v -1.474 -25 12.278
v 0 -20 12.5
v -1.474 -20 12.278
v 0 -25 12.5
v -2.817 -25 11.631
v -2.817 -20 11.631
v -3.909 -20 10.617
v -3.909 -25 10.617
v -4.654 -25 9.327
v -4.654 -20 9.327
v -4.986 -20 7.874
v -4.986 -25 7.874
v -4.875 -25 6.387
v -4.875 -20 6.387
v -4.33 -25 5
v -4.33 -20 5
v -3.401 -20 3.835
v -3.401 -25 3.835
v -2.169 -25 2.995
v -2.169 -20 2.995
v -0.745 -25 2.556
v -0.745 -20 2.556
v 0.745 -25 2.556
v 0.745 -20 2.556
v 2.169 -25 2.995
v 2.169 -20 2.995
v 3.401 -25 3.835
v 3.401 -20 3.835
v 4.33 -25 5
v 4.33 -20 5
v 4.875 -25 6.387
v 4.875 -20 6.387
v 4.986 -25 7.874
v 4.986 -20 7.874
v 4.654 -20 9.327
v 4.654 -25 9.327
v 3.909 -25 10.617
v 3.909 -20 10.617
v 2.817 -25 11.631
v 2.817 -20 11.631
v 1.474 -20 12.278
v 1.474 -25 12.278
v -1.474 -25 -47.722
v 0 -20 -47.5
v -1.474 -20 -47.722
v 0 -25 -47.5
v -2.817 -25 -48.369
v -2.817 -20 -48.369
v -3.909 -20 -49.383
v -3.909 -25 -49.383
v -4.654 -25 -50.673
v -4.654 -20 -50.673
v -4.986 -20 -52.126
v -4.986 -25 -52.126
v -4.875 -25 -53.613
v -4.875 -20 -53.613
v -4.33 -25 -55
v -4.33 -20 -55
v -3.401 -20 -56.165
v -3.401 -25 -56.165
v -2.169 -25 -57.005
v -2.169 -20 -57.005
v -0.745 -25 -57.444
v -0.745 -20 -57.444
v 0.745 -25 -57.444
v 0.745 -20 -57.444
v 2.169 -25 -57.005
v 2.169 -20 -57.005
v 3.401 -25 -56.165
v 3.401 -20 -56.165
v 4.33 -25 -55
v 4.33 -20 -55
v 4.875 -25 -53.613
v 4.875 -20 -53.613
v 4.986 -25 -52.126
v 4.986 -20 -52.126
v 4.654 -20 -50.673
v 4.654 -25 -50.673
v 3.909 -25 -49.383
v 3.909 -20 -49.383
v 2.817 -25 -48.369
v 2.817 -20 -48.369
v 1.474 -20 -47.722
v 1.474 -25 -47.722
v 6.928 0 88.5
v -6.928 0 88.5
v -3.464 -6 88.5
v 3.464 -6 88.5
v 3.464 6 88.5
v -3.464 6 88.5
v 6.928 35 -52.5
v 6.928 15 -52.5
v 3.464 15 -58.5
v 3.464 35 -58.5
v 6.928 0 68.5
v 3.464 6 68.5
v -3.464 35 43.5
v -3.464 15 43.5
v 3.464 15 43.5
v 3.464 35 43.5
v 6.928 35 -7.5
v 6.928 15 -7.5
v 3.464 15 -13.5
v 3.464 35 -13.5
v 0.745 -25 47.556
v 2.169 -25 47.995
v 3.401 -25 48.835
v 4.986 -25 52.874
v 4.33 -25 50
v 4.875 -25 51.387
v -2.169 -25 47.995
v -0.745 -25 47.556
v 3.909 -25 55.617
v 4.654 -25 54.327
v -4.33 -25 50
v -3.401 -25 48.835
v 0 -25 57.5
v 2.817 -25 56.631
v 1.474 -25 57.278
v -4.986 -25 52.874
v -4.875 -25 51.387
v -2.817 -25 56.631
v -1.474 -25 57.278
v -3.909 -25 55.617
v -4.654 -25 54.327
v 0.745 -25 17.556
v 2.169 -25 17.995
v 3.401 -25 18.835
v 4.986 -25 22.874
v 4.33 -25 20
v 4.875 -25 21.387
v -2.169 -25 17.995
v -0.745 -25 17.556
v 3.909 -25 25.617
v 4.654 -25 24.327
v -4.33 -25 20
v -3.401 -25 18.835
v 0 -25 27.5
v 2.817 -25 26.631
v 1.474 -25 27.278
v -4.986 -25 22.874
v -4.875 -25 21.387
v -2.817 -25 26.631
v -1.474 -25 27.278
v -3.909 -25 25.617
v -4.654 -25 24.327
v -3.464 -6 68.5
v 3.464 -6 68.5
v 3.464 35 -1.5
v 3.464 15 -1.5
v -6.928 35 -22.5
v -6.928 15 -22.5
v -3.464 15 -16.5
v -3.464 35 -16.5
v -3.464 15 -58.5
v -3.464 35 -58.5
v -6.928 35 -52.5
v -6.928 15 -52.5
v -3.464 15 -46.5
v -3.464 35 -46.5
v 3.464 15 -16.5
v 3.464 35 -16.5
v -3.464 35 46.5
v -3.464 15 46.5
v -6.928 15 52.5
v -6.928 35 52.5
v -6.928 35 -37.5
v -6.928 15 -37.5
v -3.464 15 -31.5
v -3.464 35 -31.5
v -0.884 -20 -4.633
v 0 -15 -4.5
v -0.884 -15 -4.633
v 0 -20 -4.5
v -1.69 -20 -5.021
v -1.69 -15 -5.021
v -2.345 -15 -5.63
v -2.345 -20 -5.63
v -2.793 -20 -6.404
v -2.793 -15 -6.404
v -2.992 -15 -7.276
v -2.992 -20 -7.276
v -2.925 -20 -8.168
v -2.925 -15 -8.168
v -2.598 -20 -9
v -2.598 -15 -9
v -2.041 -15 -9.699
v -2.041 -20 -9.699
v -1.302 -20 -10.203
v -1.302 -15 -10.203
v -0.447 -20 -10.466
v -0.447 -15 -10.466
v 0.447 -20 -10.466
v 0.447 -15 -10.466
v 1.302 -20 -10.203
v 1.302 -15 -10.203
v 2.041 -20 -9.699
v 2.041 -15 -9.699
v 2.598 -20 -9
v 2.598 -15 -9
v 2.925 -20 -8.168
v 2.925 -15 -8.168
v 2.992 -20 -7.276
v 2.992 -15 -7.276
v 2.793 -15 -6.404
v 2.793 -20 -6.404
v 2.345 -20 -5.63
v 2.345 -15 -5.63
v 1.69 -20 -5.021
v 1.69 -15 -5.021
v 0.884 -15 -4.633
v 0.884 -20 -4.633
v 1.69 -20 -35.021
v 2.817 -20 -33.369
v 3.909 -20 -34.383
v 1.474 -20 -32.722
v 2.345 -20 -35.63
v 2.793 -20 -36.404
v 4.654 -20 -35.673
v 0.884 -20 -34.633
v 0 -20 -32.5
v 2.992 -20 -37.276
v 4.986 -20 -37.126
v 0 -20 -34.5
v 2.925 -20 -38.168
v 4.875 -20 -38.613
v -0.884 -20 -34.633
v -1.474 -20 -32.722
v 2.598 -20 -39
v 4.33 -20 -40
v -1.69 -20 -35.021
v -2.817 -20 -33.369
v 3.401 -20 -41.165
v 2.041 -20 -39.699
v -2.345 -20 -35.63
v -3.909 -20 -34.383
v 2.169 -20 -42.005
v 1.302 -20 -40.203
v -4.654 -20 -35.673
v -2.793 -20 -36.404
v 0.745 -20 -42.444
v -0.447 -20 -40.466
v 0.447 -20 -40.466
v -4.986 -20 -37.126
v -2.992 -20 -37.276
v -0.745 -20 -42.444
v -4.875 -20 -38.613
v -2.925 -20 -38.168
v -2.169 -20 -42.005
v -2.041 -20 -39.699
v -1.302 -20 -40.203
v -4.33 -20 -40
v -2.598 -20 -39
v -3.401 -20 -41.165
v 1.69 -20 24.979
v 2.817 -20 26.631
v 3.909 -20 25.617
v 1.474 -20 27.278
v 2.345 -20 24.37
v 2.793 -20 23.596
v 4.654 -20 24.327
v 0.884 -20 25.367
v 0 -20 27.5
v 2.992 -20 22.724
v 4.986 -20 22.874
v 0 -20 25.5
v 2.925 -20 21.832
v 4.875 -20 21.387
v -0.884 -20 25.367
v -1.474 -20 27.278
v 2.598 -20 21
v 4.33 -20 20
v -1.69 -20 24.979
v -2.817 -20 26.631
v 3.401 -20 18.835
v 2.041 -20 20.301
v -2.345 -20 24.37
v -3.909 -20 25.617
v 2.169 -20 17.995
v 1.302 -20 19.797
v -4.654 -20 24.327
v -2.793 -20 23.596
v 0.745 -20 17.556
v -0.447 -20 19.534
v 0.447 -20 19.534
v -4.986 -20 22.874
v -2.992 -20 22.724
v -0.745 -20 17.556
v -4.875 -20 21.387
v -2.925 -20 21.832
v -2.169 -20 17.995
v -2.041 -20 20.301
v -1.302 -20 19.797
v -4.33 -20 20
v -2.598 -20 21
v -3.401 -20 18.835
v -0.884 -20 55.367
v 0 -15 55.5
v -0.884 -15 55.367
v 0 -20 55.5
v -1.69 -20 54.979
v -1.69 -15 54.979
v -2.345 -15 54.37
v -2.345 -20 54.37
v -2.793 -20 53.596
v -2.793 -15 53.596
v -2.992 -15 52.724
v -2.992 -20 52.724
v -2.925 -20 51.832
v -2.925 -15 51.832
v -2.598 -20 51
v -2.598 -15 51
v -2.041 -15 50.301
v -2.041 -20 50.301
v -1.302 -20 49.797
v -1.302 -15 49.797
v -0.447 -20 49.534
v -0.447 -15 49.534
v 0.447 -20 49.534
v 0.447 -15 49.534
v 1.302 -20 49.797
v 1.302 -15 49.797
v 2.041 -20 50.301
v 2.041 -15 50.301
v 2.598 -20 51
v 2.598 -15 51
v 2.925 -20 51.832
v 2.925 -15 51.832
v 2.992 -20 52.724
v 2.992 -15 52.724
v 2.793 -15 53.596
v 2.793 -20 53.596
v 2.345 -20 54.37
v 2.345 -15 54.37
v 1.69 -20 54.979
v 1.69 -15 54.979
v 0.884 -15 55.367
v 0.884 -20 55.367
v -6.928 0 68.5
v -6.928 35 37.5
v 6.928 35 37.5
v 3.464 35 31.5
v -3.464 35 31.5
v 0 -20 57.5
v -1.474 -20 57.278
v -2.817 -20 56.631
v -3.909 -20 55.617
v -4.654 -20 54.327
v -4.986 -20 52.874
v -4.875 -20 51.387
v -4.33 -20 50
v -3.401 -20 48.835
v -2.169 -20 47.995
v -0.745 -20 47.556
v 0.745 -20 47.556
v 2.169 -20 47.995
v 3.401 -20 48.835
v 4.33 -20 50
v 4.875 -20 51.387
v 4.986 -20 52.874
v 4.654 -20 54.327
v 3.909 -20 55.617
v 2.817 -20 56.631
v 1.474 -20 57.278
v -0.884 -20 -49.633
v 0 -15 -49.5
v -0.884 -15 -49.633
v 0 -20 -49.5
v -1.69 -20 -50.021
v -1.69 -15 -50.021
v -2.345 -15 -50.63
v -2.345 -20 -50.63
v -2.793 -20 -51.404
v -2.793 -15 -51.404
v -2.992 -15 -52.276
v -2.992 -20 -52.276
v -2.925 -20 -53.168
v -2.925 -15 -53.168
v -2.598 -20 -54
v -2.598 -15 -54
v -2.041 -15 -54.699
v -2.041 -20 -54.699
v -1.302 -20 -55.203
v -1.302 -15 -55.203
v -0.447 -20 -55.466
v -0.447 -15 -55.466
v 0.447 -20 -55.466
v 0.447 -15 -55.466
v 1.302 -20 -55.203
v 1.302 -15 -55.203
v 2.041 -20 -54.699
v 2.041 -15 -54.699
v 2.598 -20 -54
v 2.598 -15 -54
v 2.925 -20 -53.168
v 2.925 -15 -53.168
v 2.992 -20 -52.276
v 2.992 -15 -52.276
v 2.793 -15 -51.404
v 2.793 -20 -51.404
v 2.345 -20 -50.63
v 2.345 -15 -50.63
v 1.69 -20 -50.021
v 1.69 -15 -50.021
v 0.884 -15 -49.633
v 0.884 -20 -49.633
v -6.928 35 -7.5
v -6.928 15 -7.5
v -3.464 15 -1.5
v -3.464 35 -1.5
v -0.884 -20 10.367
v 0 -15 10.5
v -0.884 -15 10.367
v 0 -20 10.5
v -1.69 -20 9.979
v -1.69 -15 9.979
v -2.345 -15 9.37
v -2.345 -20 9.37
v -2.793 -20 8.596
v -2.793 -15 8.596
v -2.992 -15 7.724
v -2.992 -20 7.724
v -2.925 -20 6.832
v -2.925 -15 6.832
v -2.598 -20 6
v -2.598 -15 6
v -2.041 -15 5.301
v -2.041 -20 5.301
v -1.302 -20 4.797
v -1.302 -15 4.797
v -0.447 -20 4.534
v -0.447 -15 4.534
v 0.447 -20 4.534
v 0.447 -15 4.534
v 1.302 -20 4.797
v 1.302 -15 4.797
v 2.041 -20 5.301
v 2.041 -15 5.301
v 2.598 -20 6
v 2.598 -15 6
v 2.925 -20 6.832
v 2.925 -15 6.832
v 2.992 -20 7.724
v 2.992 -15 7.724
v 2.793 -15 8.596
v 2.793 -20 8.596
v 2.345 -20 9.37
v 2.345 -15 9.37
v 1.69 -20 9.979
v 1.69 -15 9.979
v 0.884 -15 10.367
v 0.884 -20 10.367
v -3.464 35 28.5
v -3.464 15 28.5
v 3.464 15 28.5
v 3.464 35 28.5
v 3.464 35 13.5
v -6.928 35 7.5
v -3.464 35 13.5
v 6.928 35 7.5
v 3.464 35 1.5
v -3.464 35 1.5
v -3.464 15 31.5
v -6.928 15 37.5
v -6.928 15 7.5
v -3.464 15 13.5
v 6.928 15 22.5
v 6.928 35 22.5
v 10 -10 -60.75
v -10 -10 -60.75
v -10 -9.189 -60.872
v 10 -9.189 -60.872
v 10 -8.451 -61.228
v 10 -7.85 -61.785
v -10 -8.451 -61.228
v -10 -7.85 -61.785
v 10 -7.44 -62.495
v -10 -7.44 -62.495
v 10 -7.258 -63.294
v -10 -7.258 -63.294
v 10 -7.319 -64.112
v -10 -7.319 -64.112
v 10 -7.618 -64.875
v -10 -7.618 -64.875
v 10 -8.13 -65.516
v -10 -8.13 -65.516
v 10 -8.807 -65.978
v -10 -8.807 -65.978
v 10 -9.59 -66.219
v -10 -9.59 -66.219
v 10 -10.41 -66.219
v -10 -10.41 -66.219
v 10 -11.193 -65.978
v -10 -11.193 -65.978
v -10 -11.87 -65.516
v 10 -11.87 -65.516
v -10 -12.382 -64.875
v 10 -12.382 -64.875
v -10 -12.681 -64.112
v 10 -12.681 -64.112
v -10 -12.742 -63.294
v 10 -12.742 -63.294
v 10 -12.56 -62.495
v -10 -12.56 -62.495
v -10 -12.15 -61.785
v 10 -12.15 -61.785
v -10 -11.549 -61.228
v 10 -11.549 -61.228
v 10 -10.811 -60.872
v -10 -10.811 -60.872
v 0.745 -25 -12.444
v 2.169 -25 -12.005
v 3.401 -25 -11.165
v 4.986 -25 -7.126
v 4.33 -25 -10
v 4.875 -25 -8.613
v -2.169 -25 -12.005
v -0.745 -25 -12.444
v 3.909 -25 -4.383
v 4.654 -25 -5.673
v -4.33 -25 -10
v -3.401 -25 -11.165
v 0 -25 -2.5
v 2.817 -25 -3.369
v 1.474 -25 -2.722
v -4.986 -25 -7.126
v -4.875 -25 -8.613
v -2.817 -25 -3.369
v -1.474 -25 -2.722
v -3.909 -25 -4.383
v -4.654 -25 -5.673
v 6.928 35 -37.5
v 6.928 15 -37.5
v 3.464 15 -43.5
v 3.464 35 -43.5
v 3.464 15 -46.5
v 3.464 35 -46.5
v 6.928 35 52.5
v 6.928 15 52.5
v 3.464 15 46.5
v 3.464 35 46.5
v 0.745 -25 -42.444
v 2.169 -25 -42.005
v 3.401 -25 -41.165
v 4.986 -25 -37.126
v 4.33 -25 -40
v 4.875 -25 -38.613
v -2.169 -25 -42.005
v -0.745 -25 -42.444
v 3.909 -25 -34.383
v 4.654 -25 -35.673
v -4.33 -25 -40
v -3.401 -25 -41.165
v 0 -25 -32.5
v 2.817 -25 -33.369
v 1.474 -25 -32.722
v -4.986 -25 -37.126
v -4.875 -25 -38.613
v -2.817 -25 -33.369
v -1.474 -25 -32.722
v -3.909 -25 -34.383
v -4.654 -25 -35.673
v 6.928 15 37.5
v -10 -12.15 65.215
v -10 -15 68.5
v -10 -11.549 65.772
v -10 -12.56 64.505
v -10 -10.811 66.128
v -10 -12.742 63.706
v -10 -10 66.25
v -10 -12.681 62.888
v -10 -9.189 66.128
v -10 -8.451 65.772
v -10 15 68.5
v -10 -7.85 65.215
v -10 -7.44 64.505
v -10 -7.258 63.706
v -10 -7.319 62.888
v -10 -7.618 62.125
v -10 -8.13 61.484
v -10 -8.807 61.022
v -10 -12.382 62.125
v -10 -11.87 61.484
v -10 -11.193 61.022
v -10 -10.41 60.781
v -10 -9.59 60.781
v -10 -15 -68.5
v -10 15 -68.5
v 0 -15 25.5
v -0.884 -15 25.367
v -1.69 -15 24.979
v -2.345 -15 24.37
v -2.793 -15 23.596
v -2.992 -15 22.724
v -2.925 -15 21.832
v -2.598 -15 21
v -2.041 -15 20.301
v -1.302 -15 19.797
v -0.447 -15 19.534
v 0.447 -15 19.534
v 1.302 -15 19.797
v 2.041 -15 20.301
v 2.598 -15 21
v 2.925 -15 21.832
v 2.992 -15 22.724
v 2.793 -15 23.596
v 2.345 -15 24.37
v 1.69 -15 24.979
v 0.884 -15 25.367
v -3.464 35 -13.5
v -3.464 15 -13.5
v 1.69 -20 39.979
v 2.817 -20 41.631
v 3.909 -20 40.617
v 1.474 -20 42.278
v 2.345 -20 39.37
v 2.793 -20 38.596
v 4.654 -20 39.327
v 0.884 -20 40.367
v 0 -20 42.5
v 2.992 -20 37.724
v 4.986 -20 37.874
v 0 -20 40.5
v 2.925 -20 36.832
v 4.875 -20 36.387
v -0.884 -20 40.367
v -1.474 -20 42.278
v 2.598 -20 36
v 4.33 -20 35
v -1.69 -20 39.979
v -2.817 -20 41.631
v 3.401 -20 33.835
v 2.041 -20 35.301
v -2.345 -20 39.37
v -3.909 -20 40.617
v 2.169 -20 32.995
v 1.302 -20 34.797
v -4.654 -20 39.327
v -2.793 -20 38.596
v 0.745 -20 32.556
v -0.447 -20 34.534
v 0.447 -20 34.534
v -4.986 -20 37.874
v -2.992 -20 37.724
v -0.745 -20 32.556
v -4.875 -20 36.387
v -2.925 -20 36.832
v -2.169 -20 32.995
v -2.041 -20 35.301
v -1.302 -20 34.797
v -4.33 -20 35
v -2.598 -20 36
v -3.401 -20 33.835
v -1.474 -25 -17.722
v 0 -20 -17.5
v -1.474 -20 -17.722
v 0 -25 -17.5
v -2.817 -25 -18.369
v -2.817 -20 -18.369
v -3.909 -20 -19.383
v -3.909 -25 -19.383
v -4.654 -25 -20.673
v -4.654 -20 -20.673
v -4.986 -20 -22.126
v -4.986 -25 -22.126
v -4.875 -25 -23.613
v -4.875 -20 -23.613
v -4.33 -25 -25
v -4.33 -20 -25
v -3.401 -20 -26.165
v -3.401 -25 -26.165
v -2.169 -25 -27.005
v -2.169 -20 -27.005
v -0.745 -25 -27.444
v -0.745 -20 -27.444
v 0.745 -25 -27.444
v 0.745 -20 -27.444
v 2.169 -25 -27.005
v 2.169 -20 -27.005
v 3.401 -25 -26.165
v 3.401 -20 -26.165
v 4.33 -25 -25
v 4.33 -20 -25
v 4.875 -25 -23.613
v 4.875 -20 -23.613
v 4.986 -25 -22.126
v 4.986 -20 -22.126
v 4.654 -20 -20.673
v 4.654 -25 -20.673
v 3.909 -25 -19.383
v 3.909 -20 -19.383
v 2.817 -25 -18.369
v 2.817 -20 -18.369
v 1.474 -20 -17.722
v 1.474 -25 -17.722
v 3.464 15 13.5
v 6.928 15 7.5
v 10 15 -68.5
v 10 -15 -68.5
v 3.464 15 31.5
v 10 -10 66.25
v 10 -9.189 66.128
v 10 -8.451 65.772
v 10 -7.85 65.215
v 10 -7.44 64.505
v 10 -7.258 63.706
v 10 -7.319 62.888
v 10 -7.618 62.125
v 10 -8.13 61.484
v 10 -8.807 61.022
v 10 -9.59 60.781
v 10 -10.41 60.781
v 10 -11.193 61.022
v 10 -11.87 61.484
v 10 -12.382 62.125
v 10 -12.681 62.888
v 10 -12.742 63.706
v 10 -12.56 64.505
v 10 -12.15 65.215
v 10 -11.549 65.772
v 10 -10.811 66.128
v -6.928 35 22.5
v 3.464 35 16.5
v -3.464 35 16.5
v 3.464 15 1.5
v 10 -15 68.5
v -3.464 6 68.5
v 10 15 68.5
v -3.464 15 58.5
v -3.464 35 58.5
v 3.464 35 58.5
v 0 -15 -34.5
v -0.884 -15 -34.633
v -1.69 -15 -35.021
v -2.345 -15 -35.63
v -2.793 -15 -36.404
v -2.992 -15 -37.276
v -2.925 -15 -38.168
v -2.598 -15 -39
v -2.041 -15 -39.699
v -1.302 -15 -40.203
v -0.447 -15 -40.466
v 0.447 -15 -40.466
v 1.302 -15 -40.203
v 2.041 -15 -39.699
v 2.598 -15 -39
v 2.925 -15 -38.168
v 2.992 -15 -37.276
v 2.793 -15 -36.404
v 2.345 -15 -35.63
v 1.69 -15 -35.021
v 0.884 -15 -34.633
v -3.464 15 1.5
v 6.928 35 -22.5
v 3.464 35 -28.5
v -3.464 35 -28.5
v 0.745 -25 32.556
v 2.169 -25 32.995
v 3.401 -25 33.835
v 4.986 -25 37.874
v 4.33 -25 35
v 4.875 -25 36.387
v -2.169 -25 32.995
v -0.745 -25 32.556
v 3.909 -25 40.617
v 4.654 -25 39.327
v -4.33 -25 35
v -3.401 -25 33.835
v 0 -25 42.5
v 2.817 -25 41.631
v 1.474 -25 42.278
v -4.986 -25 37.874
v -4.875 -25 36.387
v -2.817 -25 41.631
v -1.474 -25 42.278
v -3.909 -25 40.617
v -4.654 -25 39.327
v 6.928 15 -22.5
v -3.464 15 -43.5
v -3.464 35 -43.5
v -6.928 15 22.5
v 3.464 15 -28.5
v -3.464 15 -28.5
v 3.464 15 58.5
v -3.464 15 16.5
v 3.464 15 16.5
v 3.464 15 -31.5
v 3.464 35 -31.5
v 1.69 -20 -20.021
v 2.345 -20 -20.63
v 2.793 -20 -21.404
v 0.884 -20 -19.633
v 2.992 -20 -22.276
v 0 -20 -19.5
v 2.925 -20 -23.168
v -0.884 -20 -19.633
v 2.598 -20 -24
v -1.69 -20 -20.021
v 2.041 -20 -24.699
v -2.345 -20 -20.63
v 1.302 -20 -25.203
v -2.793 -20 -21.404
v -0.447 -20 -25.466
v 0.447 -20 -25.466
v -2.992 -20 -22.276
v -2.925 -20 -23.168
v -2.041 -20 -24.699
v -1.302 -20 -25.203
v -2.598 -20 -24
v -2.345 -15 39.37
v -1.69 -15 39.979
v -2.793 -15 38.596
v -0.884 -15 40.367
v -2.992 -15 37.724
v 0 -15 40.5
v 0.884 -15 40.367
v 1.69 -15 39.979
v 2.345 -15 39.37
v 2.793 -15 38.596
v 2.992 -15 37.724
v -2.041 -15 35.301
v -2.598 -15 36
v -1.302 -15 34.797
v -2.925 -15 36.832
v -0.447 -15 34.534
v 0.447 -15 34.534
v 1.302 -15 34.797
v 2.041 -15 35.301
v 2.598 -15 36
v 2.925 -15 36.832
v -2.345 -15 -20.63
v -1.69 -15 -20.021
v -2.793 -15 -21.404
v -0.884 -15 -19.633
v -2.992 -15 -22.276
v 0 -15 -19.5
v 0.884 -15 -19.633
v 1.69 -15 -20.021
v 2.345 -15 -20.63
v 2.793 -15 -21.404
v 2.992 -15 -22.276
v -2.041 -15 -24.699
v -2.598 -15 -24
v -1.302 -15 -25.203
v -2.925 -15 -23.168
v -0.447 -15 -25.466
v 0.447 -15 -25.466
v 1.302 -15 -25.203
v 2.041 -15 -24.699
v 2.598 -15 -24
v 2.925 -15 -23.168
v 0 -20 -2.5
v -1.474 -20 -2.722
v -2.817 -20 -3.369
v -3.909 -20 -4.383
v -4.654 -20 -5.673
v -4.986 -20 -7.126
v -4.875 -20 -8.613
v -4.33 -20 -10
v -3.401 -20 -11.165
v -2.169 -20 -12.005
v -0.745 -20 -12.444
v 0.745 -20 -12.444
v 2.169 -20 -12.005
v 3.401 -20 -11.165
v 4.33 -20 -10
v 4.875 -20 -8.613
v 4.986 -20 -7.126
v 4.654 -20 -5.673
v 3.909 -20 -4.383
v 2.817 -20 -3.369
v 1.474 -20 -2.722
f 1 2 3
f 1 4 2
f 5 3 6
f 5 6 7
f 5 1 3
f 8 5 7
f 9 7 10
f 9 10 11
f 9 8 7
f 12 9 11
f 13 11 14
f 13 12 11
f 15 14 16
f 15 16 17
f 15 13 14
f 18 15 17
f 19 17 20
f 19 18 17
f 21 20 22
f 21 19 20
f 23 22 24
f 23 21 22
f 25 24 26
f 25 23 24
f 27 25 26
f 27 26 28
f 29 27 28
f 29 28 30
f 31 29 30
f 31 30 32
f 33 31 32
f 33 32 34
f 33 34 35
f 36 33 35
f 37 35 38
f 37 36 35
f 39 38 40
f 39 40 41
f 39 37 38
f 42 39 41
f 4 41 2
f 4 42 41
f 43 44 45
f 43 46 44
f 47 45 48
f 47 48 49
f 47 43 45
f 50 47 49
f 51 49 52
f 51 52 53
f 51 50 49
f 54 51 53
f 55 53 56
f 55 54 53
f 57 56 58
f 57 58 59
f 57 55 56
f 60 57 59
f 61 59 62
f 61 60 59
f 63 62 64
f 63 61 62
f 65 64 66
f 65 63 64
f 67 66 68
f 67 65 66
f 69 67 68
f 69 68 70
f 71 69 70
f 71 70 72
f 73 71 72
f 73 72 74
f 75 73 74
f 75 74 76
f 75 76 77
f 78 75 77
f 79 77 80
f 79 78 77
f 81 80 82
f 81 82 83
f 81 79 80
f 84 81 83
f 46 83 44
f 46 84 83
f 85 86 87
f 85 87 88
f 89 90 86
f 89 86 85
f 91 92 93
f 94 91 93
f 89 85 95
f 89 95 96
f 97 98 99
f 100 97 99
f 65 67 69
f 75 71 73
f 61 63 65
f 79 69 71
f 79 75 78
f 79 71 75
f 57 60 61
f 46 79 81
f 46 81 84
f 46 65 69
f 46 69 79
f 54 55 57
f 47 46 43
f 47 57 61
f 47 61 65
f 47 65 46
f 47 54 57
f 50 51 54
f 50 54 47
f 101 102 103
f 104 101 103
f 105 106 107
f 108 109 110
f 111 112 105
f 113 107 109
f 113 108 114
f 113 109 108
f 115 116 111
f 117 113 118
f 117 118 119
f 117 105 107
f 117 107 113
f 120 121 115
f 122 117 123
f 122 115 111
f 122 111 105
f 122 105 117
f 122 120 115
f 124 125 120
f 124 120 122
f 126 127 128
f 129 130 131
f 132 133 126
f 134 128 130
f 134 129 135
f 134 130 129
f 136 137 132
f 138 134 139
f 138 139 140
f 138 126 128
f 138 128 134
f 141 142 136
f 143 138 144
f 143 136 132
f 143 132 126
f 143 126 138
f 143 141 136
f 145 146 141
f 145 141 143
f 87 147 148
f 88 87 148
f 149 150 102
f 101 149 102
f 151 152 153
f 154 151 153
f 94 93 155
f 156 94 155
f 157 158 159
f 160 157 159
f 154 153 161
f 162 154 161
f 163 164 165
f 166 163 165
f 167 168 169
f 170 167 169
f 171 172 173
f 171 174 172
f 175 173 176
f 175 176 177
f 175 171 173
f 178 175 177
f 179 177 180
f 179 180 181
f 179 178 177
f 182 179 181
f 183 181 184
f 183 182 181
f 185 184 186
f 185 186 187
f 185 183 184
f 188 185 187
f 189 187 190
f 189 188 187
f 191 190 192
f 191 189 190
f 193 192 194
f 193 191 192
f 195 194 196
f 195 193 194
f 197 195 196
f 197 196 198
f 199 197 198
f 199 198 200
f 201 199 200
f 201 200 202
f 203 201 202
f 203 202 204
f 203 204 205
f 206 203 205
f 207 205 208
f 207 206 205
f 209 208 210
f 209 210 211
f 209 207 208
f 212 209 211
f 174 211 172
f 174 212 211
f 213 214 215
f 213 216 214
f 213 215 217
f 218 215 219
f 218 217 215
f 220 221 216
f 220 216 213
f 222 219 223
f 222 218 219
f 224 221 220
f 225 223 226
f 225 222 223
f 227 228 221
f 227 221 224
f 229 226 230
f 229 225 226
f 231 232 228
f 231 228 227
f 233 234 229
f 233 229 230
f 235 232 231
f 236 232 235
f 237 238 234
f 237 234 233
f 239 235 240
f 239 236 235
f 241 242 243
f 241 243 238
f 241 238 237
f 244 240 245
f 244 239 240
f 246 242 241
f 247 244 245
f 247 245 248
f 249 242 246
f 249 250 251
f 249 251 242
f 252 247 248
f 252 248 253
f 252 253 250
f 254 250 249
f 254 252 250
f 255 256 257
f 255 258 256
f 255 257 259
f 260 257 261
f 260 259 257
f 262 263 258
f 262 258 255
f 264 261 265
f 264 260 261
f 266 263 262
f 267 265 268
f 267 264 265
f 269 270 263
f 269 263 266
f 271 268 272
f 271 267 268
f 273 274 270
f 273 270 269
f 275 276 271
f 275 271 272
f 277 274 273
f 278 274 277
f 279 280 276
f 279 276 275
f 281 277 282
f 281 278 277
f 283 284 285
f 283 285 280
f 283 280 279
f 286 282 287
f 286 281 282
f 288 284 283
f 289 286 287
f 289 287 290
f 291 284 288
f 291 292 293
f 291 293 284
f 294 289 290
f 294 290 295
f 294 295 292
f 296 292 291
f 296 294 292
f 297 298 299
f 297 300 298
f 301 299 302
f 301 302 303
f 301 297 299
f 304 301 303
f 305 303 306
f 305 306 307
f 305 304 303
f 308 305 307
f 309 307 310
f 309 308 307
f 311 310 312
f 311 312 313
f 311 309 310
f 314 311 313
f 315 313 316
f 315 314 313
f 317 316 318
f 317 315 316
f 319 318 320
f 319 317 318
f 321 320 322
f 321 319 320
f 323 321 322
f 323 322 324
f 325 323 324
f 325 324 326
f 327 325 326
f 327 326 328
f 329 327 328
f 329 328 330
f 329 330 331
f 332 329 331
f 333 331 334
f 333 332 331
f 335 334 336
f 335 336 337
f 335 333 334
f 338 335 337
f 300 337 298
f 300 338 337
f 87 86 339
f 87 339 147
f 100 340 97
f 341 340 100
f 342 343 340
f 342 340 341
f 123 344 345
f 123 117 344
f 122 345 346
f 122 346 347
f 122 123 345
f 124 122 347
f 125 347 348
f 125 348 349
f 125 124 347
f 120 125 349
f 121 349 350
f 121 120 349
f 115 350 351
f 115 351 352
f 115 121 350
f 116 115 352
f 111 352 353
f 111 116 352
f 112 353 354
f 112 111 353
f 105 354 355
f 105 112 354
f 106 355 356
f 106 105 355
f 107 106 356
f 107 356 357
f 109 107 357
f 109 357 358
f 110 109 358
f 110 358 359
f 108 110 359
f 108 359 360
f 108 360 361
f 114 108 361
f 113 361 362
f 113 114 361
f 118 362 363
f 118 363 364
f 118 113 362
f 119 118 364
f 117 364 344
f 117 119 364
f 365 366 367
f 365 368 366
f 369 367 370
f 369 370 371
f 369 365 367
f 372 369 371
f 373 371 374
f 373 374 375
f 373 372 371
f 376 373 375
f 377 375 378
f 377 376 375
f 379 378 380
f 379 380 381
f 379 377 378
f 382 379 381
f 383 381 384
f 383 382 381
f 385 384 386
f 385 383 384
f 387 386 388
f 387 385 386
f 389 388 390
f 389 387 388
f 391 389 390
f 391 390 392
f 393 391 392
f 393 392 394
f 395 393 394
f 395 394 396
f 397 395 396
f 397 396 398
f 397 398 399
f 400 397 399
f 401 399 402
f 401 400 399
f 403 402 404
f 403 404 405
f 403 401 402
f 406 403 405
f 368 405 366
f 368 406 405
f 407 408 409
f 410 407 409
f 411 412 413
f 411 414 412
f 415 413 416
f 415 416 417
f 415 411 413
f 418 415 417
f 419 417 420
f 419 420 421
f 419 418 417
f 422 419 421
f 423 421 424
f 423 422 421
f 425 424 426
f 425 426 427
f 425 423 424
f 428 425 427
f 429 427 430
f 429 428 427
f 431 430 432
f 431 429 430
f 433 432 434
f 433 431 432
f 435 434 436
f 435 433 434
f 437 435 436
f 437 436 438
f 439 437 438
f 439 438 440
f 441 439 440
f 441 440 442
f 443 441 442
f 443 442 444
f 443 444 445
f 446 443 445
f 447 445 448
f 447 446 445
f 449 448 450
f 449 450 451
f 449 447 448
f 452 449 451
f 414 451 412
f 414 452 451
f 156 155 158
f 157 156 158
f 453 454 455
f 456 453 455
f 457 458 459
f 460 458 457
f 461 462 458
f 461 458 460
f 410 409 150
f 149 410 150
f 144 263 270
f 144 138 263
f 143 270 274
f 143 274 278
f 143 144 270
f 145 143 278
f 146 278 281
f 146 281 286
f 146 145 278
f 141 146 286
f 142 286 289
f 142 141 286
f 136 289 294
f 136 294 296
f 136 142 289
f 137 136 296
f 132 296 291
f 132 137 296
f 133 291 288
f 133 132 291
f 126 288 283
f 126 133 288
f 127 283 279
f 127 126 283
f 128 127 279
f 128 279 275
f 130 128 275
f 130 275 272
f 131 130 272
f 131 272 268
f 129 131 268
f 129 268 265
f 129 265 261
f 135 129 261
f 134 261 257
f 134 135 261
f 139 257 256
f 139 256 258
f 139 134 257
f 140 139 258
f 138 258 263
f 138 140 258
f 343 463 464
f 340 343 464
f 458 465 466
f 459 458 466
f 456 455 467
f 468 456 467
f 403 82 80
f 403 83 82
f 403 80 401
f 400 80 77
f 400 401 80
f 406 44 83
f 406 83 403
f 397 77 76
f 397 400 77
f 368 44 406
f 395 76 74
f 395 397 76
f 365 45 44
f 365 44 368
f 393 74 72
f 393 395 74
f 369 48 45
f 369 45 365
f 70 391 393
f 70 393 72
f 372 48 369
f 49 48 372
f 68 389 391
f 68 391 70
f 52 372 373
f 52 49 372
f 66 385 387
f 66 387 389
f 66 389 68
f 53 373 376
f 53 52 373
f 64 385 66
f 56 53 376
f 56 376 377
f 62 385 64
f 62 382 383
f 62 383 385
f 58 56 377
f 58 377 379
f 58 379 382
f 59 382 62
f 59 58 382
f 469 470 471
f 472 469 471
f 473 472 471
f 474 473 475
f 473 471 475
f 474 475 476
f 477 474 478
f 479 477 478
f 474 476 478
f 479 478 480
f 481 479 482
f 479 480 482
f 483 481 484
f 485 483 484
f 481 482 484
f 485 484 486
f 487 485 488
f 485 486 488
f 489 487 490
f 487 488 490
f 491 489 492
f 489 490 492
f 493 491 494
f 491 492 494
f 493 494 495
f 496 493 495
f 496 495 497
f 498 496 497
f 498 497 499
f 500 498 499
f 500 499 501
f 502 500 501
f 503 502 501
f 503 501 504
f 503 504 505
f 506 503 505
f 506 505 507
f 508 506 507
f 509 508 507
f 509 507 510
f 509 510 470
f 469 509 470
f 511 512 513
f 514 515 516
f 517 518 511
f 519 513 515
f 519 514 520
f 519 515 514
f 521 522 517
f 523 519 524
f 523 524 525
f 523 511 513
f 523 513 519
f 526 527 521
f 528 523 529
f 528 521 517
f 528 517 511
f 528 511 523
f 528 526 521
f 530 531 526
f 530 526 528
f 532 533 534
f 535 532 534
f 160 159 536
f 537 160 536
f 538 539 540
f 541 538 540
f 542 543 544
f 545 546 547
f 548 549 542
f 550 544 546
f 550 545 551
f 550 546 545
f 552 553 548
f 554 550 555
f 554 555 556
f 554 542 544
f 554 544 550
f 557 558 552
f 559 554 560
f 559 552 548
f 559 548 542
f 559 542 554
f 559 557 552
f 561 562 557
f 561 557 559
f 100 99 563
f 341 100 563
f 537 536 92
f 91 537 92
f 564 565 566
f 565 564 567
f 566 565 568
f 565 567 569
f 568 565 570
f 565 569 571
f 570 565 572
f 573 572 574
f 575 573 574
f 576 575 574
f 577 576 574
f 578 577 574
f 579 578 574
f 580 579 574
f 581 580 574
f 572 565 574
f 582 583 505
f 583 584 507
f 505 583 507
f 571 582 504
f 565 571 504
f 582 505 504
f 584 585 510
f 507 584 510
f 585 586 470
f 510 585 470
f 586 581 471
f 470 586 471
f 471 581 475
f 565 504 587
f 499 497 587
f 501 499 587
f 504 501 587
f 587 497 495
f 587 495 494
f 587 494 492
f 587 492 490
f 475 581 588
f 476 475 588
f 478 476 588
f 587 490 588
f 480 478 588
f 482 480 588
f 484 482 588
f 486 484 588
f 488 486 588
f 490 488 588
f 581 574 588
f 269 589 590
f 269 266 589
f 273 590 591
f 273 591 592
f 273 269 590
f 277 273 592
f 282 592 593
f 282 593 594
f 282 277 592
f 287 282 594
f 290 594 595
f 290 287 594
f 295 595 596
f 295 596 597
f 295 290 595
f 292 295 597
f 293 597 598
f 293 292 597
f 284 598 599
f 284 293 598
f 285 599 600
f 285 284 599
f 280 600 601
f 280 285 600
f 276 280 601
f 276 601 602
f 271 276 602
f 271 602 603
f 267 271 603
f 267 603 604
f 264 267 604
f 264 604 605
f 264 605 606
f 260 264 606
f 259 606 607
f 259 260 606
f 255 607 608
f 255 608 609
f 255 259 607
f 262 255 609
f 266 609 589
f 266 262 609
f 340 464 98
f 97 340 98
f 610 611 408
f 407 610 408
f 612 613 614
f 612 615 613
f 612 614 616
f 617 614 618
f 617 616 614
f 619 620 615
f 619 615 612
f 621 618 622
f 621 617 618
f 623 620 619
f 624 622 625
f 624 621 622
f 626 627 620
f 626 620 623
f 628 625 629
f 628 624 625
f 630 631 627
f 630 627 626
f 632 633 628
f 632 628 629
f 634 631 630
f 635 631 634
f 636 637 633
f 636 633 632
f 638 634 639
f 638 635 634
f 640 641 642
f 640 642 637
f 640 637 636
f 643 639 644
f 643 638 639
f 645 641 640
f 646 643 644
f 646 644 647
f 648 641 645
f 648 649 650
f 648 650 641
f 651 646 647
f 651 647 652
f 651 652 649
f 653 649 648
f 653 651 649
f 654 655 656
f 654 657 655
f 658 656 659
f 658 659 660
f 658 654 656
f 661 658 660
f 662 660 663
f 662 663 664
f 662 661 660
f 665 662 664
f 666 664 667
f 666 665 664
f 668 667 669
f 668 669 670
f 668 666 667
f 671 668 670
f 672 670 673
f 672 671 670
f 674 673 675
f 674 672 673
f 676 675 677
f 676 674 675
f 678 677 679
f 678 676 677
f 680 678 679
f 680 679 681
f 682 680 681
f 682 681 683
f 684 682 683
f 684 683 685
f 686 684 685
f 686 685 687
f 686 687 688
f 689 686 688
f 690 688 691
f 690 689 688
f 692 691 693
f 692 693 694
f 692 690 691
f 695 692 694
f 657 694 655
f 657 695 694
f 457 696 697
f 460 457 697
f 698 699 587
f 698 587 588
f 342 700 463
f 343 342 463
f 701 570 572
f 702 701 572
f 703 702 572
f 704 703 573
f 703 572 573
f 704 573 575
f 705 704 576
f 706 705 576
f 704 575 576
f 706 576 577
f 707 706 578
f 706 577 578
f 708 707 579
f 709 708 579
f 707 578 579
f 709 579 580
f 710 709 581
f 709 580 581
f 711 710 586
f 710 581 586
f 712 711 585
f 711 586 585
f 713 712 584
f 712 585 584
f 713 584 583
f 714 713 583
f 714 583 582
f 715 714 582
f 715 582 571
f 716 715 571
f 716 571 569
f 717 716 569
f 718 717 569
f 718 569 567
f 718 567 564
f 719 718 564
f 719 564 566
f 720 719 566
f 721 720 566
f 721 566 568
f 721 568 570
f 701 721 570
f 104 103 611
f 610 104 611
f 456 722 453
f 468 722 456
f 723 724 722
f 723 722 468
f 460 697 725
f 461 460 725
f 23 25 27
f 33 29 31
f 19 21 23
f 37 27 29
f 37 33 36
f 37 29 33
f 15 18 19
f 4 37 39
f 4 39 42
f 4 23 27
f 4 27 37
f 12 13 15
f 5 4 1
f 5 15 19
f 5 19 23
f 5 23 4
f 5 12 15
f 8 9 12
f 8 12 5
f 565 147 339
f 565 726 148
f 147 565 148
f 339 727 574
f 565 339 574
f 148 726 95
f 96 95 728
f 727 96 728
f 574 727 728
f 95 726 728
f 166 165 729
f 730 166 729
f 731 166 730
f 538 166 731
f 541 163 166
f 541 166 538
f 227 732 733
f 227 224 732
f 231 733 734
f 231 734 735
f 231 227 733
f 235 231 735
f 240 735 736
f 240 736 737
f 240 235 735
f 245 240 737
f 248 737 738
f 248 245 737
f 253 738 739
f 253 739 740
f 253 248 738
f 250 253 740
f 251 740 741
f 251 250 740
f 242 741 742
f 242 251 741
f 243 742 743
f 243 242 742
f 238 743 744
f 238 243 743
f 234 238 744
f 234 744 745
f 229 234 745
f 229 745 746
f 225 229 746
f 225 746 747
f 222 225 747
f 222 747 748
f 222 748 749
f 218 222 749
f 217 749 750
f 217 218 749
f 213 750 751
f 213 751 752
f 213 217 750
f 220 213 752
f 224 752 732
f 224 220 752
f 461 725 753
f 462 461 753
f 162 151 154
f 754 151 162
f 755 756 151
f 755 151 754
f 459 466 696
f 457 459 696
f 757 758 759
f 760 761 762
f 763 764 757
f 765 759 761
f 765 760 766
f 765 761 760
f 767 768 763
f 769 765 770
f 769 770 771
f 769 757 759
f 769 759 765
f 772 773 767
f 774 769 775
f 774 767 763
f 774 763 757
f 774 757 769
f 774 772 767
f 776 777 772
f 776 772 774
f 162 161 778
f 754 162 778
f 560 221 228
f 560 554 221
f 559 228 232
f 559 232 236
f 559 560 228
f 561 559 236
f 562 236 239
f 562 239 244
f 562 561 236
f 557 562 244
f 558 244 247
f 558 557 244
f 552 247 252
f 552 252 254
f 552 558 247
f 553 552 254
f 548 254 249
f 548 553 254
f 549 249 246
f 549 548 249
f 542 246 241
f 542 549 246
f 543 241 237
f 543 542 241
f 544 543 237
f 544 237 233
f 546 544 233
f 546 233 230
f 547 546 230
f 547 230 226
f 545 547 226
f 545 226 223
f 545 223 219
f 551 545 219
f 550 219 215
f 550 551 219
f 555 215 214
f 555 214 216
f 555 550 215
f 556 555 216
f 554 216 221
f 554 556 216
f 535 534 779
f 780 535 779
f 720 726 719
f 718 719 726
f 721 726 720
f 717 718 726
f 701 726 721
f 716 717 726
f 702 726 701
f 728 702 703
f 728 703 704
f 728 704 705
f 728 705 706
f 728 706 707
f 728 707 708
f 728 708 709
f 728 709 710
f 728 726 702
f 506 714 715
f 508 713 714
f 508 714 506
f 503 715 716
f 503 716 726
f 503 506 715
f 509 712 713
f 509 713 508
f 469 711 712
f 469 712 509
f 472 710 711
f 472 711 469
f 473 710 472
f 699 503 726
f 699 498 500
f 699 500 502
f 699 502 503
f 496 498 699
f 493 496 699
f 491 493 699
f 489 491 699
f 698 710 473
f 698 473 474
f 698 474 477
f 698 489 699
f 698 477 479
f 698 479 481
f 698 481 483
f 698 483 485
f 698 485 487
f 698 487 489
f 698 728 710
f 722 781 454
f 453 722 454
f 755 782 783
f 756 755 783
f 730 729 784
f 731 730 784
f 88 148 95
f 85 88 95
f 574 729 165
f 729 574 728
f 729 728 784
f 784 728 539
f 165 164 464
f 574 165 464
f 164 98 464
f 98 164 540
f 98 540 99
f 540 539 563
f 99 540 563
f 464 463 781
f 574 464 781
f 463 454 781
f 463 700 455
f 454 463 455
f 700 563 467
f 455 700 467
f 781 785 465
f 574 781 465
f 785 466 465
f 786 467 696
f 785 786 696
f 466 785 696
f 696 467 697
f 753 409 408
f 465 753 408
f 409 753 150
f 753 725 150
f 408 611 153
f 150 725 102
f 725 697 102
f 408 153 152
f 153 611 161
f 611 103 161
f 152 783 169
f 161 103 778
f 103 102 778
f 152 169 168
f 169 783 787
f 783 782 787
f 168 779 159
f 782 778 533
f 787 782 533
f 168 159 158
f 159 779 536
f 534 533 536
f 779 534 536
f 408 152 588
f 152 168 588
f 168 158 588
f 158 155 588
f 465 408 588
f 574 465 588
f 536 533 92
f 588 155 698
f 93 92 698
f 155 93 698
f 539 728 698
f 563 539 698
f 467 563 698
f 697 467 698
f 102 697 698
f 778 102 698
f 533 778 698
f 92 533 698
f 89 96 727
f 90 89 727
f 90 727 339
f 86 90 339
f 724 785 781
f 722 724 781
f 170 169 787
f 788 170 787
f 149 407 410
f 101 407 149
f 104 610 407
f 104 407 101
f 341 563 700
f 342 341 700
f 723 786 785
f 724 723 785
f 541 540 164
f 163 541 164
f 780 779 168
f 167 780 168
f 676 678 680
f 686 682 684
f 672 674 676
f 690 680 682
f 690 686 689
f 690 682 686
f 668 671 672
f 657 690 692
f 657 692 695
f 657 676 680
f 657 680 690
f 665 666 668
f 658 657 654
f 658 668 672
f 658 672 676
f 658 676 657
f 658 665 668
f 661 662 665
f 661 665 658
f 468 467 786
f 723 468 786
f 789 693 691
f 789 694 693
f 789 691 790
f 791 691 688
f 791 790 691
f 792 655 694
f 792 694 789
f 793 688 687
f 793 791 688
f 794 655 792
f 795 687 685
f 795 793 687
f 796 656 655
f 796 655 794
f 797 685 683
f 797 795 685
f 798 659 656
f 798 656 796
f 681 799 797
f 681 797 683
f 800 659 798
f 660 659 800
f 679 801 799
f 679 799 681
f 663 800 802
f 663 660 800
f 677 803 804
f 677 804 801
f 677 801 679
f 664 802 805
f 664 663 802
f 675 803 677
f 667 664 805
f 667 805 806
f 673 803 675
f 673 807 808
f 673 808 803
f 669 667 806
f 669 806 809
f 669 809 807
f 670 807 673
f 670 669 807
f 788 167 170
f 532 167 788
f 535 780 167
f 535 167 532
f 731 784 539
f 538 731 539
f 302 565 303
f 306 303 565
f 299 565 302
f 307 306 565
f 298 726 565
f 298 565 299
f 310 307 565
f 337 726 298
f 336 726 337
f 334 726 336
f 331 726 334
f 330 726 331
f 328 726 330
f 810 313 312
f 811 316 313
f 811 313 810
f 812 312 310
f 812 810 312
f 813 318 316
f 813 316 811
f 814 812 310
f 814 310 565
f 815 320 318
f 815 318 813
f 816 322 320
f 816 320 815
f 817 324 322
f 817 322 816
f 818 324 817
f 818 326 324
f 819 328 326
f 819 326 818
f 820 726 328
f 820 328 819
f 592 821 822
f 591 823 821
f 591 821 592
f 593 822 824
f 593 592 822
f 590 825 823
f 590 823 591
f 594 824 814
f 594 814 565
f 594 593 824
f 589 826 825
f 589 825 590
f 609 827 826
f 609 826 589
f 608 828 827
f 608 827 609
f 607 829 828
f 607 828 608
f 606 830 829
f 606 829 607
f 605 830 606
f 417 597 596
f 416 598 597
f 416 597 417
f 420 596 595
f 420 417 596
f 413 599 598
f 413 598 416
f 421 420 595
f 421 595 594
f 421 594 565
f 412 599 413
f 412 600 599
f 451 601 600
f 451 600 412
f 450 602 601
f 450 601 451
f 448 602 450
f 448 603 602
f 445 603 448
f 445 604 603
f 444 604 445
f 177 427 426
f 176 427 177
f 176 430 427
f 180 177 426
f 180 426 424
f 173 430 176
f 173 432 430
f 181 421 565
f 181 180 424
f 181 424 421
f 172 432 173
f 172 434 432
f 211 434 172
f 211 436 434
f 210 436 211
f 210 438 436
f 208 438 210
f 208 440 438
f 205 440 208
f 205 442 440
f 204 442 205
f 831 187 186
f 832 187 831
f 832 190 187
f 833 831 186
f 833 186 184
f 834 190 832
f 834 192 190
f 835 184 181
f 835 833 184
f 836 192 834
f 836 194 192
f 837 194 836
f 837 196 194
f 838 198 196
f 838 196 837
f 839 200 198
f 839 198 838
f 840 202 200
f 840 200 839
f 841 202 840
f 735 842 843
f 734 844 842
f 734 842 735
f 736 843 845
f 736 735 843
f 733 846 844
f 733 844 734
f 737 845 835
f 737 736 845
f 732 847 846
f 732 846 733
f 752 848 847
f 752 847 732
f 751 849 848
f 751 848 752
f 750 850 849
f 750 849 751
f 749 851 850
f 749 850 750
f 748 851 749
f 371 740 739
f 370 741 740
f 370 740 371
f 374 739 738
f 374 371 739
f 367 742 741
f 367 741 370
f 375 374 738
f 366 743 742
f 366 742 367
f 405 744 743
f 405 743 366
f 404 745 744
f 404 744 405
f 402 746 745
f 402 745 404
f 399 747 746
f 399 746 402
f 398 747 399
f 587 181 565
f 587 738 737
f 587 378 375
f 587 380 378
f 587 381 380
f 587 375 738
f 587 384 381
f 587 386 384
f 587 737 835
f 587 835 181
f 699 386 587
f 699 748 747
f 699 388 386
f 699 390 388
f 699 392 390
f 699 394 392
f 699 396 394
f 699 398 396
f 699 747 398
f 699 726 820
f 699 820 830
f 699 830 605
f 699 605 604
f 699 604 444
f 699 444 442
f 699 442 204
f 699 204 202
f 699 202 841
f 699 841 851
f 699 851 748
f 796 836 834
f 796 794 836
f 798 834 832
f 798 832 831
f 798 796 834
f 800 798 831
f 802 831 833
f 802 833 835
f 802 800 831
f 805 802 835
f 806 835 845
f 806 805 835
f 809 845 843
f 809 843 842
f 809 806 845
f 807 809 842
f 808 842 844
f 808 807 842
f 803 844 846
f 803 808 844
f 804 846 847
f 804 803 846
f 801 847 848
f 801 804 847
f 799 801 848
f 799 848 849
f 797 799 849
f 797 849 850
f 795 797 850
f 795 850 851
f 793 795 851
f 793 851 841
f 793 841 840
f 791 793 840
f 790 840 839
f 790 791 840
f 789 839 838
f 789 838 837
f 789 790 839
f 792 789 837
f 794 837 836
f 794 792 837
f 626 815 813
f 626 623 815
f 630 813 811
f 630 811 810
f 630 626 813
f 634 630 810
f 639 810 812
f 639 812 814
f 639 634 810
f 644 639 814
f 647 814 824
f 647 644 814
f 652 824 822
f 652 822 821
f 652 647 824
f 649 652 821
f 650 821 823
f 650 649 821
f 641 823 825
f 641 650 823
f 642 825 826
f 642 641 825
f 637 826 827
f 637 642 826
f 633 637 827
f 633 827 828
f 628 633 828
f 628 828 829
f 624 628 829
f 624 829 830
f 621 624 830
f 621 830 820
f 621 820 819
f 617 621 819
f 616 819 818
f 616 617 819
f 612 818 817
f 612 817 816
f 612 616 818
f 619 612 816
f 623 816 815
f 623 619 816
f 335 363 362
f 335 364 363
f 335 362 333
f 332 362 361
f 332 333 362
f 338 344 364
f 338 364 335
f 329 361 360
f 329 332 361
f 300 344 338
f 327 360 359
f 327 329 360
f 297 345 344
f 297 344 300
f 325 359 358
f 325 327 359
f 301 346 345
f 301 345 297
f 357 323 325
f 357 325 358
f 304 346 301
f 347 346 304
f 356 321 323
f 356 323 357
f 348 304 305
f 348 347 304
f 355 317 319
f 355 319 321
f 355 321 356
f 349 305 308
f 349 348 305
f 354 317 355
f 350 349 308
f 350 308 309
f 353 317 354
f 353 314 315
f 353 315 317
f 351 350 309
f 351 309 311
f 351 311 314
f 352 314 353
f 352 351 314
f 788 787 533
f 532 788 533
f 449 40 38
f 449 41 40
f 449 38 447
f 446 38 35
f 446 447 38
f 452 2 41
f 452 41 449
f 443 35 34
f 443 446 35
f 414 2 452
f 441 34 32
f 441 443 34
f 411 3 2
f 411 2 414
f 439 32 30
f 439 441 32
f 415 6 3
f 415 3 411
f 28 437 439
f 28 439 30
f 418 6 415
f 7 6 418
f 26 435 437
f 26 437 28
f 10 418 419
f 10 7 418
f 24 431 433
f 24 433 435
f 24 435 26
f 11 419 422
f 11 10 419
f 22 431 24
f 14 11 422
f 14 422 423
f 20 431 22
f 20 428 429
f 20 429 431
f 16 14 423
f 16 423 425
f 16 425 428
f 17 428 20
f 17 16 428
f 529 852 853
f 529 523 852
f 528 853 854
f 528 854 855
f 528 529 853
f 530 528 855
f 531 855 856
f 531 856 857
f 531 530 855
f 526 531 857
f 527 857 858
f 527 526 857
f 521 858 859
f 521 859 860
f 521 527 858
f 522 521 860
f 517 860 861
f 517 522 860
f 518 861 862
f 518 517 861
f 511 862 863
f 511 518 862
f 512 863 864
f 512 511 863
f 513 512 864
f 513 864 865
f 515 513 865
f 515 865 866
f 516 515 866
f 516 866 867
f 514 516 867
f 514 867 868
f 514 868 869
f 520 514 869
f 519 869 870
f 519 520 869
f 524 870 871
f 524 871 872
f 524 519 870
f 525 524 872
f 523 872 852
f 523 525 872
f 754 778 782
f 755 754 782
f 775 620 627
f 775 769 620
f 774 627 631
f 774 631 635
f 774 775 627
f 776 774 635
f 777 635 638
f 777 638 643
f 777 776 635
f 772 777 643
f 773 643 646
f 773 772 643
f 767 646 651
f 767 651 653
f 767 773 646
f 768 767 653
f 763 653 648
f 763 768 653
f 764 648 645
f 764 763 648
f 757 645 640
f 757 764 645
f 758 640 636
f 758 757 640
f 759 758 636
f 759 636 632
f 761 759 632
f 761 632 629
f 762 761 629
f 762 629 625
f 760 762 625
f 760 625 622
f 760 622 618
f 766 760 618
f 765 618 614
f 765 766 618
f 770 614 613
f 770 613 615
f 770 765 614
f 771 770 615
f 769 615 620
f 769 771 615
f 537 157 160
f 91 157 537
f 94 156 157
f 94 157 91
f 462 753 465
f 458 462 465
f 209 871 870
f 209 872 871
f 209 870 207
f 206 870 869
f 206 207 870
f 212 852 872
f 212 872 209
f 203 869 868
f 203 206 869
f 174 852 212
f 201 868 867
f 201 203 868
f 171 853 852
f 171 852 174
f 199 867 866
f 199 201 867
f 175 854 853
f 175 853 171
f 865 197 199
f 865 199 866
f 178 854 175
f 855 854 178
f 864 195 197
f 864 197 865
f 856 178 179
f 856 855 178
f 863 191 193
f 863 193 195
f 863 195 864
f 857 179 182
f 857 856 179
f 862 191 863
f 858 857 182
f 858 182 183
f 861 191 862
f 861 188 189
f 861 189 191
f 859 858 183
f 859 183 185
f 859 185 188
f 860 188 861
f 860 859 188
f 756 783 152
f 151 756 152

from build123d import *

# Parameters (mm, degrees)
SKETCH_1_W             = 137
SKETCH_1_H             = 30
EXTRUDE_1_DEPTH        = 10
HOLE_WIZARD_M5_1_D     = 5.5
EXTRUDE_2_DEPTH        = 20
PATTERN_LINEAR_1_COUNT = 8
PATTERN_LINEAR_1_PITCH = 15
EXTRUDE_4_DEPTH        = 20


with BuildPart() as part:
    # 草图1 → 凸台-拉伸1 (new, symmetric)
    with BuildSketch(Plane(origin=(0, 0, 0), x_dir=(0, 0, -1), z_dir=(1, 0, 0))):
        Rectangle(SKETCH_1_W, SKETCH_1_H)
    extrude(amount=EXTRUDE_1_DEPTH, both=True)

    # M5 间隙孔1 (through all)
    with Locations(Plane(origin=(10, 0, 0), x_dir=(0, 0, -1), z_dir=(1, 0, 0))):
        with Locations((-63.5, -10), (63.5, -10)):
            Hole(HOLE_WIZARD_M5_1_D / 2)

    # 草图4 → 凸台-拉伸2 (add)
    with BuildSketch(Plane(origin=(0, 15, 0), x_dir=(1, 0, 0), z_dir=(0, 1, 0))):
        Polygon((6.92820323, -52.5), (3.464101615, -46.5), (-3.464101615, -46.5), (-6.92820323, -52.5), (-3.464101615, -58.5), (3.464101615, -58.5), align=None)
    extrude_2 = extrude(amount=EXTRUDE_2_DEPTH)

    # 草图6 → 旋转1 (revolve)
    with BuildSketch(Plane(origin=(0, 0, 0), x_dir=(0, 0, -1), z_dir=(1, 0, 0)), mode=Mode.PRIVATE) as revolve_1_sk:
        Polygon((-52.5, -15), (-49.5, -15), (-49.5, -20), (-47.5, -20), (-47.5, -25), (-52.5, -25), align=None)
    revolve_1 = revolve(revolve_1_sk.sketch.rotate(Axis((0, 35, 52.5), (0, -1, 0)), 180), axis=Axis((0, 35, 52.5), (0, -1, 0)))

    # 阵列(线性)1: 凸台-拉伸2, 旋转1 ×8
    with Locations(*[(0, 0, -i * PATTERN_LINEAR_1_PITCH) for i in range(1, PATTERN_LINEAR_1_COUNT)]):
        add(extrude_2)
        add(revolve_1)

    # 草图5 → 凸台-拉伸4 (add)
    with BuildSketch(Plane.XY.offset(68.5)):
        Polygon((3.464101615, 6), (-3.464101615, 6), (-6.92820323, 0), (-3.464101615, -6), (3.464101615, -6), (6.92820323, 0), align=None)
    extrude(amount=EXTRUDE_4_DEPTH)


solid = part.part
